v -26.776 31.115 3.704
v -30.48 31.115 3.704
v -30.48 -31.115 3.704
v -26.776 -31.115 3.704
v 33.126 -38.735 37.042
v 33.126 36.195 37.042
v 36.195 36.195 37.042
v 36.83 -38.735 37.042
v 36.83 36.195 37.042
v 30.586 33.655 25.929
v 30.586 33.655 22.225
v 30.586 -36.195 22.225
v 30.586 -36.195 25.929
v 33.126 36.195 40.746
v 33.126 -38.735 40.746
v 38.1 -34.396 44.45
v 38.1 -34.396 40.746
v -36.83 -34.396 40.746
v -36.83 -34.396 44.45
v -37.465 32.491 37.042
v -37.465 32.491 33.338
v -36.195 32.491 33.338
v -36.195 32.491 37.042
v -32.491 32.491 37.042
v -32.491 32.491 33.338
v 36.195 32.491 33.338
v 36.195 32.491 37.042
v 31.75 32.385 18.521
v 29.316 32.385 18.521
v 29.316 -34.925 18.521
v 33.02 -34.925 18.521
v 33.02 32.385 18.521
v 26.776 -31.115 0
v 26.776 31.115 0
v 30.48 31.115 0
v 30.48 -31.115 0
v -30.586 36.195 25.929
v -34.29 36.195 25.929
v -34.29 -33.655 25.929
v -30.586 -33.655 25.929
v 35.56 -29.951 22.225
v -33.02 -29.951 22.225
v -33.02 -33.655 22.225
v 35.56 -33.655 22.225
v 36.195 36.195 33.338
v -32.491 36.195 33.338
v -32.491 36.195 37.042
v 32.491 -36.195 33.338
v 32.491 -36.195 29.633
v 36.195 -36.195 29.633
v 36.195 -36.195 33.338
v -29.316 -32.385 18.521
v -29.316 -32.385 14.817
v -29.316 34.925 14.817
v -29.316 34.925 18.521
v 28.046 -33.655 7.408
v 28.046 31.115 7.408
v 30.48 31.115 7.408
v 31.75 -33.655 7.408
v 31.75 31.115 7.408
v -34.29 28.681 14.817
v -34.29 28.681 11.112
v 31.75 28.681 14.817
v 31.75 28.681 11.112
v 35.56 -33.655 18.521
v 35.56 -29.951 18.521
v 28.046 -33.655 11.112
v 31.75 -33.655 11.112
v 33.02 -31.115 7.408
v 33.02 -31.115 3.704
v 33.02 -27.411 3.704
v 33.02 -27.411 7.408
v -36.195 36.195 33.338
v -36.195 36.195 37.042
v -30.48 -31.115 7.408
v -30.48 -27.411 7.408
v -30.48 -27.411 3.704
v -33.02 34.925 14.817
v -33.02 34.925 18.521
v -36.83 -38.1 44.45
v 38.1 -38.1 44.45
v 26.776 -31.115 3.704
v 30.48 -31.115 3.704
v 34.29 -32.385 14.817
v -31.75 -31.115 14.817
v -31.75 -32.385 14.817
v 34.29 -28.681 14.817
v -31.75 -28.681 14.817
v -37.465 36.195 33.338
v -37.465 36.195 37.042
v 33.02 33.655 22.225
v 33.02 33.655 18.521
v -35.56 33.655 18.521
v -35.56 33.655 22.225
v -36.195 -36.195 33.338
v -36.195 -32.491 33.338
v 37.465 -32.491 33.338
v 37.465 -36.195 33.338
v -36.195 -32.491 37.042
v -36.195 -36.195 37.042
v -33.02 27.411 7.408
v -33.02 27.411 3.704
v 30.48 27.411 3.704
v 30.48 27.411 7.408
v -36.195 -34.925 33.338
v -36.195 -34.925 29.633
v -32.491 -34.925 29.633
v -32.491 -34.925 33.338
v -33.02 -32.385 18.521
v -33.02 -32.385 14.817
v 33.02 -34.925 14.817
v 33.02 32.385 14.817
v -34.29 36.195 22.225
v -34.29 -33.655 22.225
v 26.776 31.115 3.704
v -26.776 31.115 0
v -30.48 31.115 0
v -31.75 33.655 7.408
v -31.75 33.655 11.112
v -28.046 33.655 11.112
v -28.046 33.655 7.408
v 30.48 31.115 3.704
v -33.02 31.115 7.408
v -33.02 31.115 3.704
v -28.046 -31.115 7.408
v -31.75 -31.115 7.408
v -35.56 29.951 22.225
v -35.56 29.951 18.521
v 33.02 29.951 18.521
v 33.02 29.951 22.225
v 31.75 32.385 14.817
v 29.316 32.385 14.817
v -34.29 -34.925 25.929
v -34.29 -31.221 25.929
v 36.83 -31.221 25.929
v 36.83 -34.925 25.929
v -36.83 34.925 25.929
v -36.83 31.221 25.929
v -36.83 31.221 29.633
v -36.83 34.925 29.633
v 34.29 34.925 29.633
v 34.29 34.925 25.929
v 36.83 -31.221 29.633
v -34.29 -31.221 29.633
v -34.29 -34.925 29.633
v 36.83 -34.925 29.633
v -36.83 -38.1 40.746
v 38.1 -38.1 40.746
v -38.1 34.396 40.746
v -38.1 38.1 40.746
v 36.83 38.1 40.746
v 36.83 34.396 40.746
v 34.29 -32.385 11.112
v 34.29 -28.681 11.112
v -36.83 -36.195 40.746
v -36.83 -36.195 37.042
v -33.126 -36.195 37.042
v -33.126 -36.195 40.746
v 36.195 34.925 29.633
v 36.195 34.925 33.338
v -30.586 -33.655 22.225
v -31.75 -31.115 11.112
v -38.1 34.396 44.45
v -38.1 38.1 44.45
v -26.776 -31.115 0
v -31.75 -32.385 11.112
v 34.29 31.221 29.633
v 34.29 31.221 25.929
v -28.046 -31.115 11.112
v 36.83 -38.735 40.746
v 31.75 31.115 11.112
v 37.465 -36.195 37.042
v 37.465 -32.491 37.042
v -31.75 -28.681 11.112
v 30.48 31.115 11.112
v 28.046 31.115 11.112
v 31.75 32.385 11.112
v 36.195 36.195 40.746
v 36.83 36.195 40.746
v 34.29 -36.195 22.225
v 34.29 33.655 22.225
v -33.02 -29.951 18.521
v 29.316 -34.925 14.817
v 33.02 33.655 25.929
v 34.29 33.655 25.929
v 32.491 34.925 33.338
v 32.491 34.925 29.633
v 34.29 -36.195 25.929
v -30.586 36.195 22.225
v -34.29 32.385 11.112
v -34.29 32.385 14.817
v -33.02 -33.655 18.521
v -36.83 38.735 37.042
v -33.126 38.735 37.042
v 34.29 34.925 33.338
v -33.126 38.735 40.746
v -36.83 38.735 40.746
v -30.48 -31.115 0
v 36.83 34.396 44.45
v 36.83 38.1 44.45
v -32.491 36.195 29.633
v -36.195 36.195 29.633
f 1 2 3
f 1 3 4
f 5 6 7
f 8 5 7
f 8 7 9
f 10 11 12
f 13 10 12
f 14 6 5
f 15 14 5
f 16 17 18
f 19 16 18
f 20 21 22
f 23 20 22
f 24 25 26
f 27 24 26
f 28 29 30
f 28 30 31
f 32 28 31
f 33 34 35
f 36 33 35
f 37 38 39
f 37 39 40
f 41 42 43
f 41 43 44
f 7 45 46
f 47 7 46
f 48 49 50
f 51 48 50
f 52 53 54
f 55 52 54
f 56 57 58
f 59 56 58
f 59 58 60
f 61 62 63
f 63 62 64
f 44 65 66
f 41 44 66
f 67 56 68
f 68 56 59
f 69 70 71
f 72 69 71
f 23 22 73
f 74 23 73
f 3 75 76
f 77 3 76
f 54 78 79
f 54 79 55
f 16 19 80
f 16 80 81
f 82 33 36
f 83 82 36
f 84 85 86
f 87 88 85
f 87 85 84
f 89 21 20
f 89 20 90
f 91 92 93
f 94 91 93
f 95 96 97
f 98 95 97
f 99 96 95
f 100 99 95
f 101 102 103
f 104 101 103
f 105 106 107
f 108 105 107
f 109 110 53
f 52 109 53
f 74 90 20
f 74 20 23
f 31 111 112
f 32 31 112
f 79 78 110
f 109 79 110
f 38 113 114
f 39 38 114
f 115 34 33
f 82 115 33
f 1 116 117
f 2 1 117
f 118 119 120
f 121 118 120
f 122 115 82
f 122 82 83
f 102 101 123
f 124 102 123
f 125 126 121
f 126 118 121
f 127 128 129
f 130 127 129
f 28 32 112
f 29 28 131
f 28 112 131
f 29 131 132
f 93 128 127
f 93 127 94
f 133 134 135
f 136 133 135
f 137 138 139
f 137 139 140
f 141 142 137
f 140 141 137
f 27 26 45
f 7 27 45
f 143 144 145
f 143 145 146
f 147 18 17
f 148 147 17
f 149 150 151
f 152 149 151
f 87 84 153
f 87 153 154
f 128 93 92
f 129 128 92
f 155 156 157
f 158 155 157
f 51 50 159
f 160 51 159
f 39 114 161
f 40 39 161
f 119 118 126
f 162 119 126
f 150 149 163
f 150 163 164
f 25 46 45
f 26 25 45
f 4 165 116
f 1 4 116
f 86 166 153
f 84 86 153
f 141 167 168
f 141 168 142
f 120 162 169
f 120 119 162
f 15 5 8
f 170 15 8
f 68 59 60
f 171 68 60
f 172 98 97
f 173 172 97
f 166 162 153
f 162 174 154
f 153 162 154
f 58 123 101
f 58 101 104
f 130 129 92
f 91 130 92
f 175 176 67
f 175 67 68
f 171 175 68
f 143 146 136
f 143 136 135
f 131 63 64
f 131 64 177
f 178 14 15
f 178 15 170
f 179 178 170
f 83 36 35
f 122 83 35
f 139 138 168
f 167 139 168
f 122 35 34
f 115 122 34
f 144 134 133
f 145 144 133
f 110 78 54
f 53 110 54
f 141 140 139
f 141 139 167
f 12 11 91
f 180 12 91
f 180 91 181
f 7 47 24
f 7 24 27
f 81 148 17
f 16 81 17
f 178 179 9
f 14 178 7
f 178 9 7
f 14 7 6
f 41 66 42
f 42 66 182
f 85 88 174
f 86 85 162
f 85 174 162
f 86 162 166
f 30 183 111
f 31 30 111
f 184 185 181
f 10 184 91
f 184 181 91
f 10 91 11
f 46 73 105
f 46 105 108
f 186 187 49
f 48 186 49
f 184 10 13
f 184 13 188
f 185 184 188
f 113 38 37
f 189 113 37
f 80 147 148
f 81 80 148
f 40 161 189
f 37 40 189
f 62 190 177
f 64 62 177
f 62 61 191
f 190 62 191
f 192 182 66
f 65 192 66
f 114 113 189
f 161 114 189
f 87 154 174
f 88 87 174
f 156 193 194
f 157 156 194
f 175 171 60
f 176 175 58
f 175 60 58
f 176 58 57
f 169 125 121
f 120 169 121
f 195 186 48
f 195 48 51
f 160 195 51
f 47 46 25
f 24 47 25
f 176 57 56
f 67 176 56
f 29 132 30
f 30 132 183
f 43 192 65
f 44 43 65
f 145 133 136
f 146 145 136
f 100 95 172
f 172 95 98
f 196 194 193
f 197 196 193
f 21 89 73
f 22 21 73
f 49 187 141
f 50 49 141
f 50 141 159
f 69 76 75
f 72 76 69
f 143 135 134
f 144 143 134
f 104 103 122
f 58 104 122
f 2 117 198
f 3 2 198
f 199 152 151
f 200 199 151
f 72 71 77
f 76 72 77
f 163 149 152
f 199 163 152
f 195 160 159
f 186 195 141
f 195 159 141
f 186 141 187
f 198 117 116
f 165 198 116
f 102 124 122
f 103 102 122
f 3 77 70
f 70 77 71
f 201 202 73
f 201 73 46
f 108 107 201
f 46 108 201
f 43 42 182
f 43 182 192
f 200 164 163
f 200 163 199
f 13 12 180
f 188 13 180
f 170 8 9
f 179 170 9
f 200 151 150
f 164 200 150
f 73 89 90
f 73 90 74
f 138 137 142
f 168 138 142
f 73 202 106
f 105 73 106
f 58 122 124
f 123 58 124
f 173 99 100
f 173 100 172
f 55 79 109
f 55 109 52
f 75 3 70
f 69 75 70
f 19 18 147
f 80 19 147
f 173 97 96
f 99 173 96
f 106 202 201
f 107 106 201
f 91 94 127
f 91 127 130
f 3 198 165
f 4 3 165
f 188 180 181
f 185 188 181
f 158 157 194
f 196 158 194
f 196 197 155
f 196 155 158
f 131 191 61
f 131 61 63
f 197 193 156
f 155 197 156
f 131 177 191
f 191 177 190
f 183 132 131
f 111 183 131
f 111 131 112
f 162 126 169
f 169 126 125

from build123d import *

# Parameters (mm, degrees)
F1_DEPTH  = 3.7041666667
F2_W      = 2.54
F2_H      = 3.7041666667
F2_W_2    = 3.7041666667
F3_DEPTH  = 3.7041666667
F4_W      = 3.7041666667
F4_H      = 2.54
F4_H_2    = 3.7041666667
F5_DEPTH  = 3.7041666667
F4_W_2    = 2.4341666667
F6_W      = 3.7041666667
F6_H      = 2.4341666667
F7_DEPTH  = 3.7041666667
F6_H_2    = 3.7041666667
F6_W_2    = 2.54
F8_W      = 3.7041666667
F8_H      = 2.54
F8_H_2    = 3.7041666667
F9_DEPTH  = 3.7041666667
F8_W_2    = 2.4341666667
F10_W     = 3.7041666667
F10_H     = 3.7041666667
F10_W_2   = 2.54
F11_DEPTH = 3.7041666667
F10_H_2   = 2.4341666667
F12_W     = 3.7041666667
F12_H     = 3.7041666667
F12_H_2   = 2.54
F13_DEPTH = 3.7041666667
F12_W_2   = 2.4341666667
F14_W     = 3.7041666667
F14_H     = 3.7041666667
F14_W_2   = 2.54
F15_DEPTH = 3.7041666667
F14_H_2   = 2.4341666667
F16_W     = 3.7041666667
F16_H     = 3.7041666667
F16_H_2   = 1.27
F17_DEPTH = 3.7041666667
F16_W_2   = 1.7991666667
F18_W     = 1.27
F18_H     = 3.7041666667
F19_DEPTH = 3.7041666667
F18_W_2   = 3.7041666667
F18_H_2   = 2.4341666667
F21_DEPTH = 3.7041666667
F20_W     = 3.0691666667
F20_H     = 3.7041666667
F22_W     = 1.27
F22_H     = 3.7041666667
F22_W_2   = 3.7041666667
F23_DEPTH = 3.7041666667
F22_H_2   = 1.7991666667


# Not quite as in the source:
# - a feature names something its author has since deleted; it is built from what else it names


with BuildPart() as f1:
    # F0 (on Top) → F1 (new body)
    with BuildSketch(Plane.XY):
        Polygon((30.48, 31.115), (26.7758333333, 31.115), (26.7758333333, -6.985), (26.7758333333, -31.115), (30.48, -31.115), align=None)
    extrude(amount=F1_DEPTH)


with BuildPart() as f1b:
    # F0 (on Top) → F1, piece 2 (new body)
    with BuildSketch(Plane.XY):
        Polygon((-26.7758333333, -31.115), (-26.7758333333, 6.985), (-26.7758333333, 31.115), (-30.48, 31.115), (-30.48, -31.115), align=None)
    extrude(amount=F1_DEPTH)


with BuildPart() as f3:
    # F2 (on face) → F3 (new body)
    with BuildSketch(Plane.XY.offset(3.7041666667)):
        Polygon((-26.7758333333, 31.115), (-26.7758333333, 27.4108333333), (0, 27.4108333333), (30.48, 27.4108333333), (30.48, 31.115), align=None)
        with Locations((-31.75, 29.2629166667)):
            Rectangle(F2_W, F2_H)
        with Locations((-28.6279166667, 29.2629166667)):
            Rectangle(F2_W_2, F2_H)
    extrude(amount=F3_DEPTH)


with BuildPart() as f3b:
    # F2 (on face) → F3, piece 2 (new body)
    with BuildSketch(Plane.XY.offset(3.7041666667)):
        with Locations((-28.6279166667, -29.2629166667)):
            Rectangle(F2_W_2, F2_H)
        Polygon((-26.7758333333, -27.4108333333), (-26.7758333333, -31.115), (33.02, -31.115), (33.02, -27.4108333333), (0, -27.4108333333), align=None)
    extrude(amount=F3_DEPTH)


with BuildPart() as f5:
    # F4 (on face) → F5 (new body)
    with BuildSketch(Plane.XY.offset(7.4083333333)):
        Polygon((-28.0458333333, 27.4108333333), (-31.75, 27.4108333333), (-31.75, -31.115), (-28.0458333333, -31.115), (-28.0458333333, 0), align=None)
        with Locations((-29.8979166667, 32.385)):
            Rectangle(F4_W, F4_H)
        with Locations((-29.8979166667, 29.2629166667)):
            Rectangle(F4_W, F4_H_2)
    extrude(amount=F5_DEPTH)


with BuildPart() as f5b:
    # F4 (on face) → F5, piece 2 (new body)
    with BuildSketch(Plane.XY.offset(7.4083333333)):
        with Locations((29.2629166667, 29.2629166667)):
            Rectangle(F4_W_2, F4_H_2)
        Polygon((30.48, 27.4108333333), (28.0458333333, 27.4108333333), (28.0458333333, 0), (28.0458333333, -33.655), (31.75, -33.655), (31.75, 31.115), (30.48, 31.115), align=None)
    extrude(amount=F5_DEPTH)


with BuildPart() as f7:
    # F6 (on face) → F7 (new body)
    with BuildSketch(Plane.XY.offset(11.1125)):
        Polygon((0, -28.6808333333), (-28.0458333333, -28.6808333333), (-28.0458333333, -31.115), (-31.75, -31.115), (-31.75, -32.385), (34.29, -32.385), (34.29, -28.6808333333), align=None)
        with Locations((-29.8979166667, -29.8979166667)):
            Rectangle(F6_W, F6_H)
    extrude(amount=F7_DEPTH)


with BuildPart() as f7b:
    # F6 (on face) → F7, piece 2 (new body)
    with BuildSketch(Plane.XY.offset(11.1125)):
        Polygon((31.75, 32.385), (-28.0458333333, 32.385), (-28.0458333333, 28.6808333333), (0, 28.6808333333), (31.75, 28.6808333333), align=None)
        with Locations((-29.8979166667, 30.5329166667)):
            Rectangle(F6_W, F6_H_2)
        with Locations((-33.02, 30.5329166667)):
            Rectangle(F6_W_2, F6_H_2)
    extrude(amount=F7_DEPTH)


with BuildPart() as f9:
    # F8 (on face) → F9 (new body)
    with BuildSketch(Plane.XY.offset(14.8166666667)):
        Polygon((-29.3158333333, -32.385), (-29.3158333333, 0), (-29.3158333333, 28.6808333333), (-33.02, 28.6808333333), (-33.02, -32.385), align=None)
        with Locations((-31.1679166667, 33.655)):
            Rectangle(F8_W, F8_H)
        with Locations((-31.1679166667, 30.5329166667)):
            Rectangle(F8_W, F8_H_2)
    extrude(amount=F9_DEPTH)


with BuildPart() as f9b:
    # F8 (on face) → F9, piece 2 (new body)
    with BuildSketch(Plane.XY.offset(14.8166666667)):
        with Locations((30.5329166667, 30.5329166667)):
            Rectangle(F8_W_2, F8_H_2)
        Polygon((29.3158333333, -34.925), (33.02, -34.925), (33.02, 32.385), (31.75, 32.385), (31.75, 28.6808333333), (29.3158333333, 28.6808333333), (29.3158333333, 0), align=None)
    extrude(amount=F9_DEPTH)


with BuildPart() as f11:
    # F10 (on face) → F11 (new body)
    with BuildSketch(Plane.XY.offset(18.5208333333)):
        Polygon((-29.3158333333, 29.9508333333), (0, 29.9508333333), (33.02, 29.9508333333), (33.02, 33.655), (-29.3158333333, 33.655), align=None)
        with Locations((-31.1679166667, 31.8029166667)):
            Rectangle(F10_W, F10_H)
        with Locations((-34.29, 31.8029166667)):
            Rectangle(F10_W_2, F10_H)
    extrude(amount=F11_DEPTH)


with BuildPart() as f11b:
    # F10 (on face) → F11, piece 2 (new body)
    with BuildSketch(Plane.XY.offset(18.5208333333)):
        with Locations((-31.1679166667, -31.1679166667)):
            Rectangle(F10_W, F10_H_2)
        Polygon((35.56, -29.9508333333), (0, -29.9508333333), (-29.3158333333, -29.9508333333), (-29.3158333333, -32.385), (-33.02, -32.385), (-33.02, -33.655), (35.56, -33.655), align=None)
    extrude(amount=F11_DEPTH)


with BuildPart() as f13:
    # F12 (on face) → F13 (new body)
    with BuildSketch(Plane.XY.offset(22.225)):
        Polygon((-30.5858333333, -33.655), (-30.5858333333, 0), (-30.5858333333, 29.9508333333), (-34.29, 29.9508333333), (-34.29, -33.655), align=None)
        with Locations((-32.4379166667, 31.8029166667)):
            Rectangle(F12_W, F12_H)
        with Locations((-32.4379166667, 34.925)):
            Rectangle(F12_W, F12_H_2)
    extrude(amount=F13_DEPTH)


with BuildPart() as f13b:
    # F12 (on face) → F13, piece 2 (new body)
    with BuildSketch(Plane.XY.offset(22.225)):
        Polygon((34.29, -36.195), (34.29, 33.655), (33.02, 33.655), (33.02, 29.9508333333), (30.5858333333, 29.9508333333), (30.5858333333, 0), (30.5858333333, -36.195), align=None)
        with Locations((31.8029166667, 31.8029166667)):
            Rectangle(F12_W_2, F12_H)
    extrude(amount=F13_DEPTH)


with BuildPart() as f15:
    # F14 (on face) → F15 (new body)
    with BuildSketch(Plane.XY.offset(25.9291666667)):
        Polygon((34.29, 34.925), (-30.5858333333, 34.925), (-30.5858333333, 31.2208333333), (0, 31.2208333333), (34.29, 31.2208333333), align=None)
        with Locations((-32.4379166667, 33.0729166667)):
            Rectangle(F14_W, F14_H)
        with Locations((-35.56, 33.0729166667)):
            Rectangle(F14_W_2, F14_H)
    extrude(amount=F15_DEPTH)


with BuildPart() as f15b:
    # F14 (on face) → F15, piece 2 (new body)
    with BuildSketch(Plane.XY.offset(25.9291666667)):
        with Locations((-32.4379166667, -32.4379166667)):
            Rectangle(F14_W, F14_H_2)
        Polygon((0, -31.2208333333), (-30.5858333333, -31.2208333333), (-30.5858333333, -33.655), (-34.29, -33.655), (-34.29, -34.925), (36.83, -34.925), (36.83, -31.2208333333), align=None)
    extrude(amount=F15_DEPTH)


with BuildPart() as f17:
    # F16 (on face) → F17 (new body)
    with BuildSketch(Plane.XY.offset(29.6333333333)):
        Polygon((-32.4908333333, -34.925), (-32.4908333333, 0), (-32.4908333333, 31.2208333333), (-36.195, 31.2208333333), (-36.195, -34.925), align=None)
        with Locations((-34.3429166667, 33.0729166667)):
            Rectangle(F16_W, F16_H)
        with Locations((-34.3429166667, 35.56)):
            Rectangle(F16_W, F16_H_2)
    extrude(amount=F17_DEPTH)


with BuildPart() as f17b:
    # F16 (on face) → F17, piece 2 (new body)
    with BuildSketch(Plane.XY.offset(29.6333333333)):
        with Locations((33.3904166667, 33.0729166667)):
            Rectangle(F16_W_2, F16_H)
        Polygon((36.195, -36.195), (36.195, 34.925), (34.29, 34.925), (34.29, 31.2208333333), (32.4908333333, 31.2208333333), (32.4908333333, 0), (32.4908333333, -36.195), align=None)
    extrude(amount=F17_DEPTH)


with BuildPart() as f19:
    # F18 (on face) → F19 (new body)
    with BuildSketch(Plane.XY.offset(33.3375)):
        with Locations((-36.83, 34.3429166667)):
            Rectangle(F18_W, F18_H)
    extrude(amount=F19_DEPTH)


with BuildPart() as f19b:
    # F18 (on face) → F19, piece 2 (new body)
    with BuildSketch(Plane.XY.offset(33.3375)):
        Polygon((36.195, 36.195), (-32.4908333333, 36.195), (-32.4908333333, 32.4908333333), (0, 32.4908333333), (36.195, 32.4908333333), align=None)
    extrude(amount=F19_DEPTH)


with BuildPart() as f19c:
    # F18 (on face) → F19, piece 3 (new body)
    with BuildSketch(Plane.XY.offset(33.3375)):
        with Locations((-34.3429166667, -33.7079166667)):
            Rectangle(F18_W_2, F18_H_2)
        Polygon((0, -32.4908333333), (-32.4908333333, -32.4908333333), (-32.4908333333, -34.925), (-36.195, -34.925), (-36.195, -36.195), (37.465, -36.195), (37.465, -32.4908333333), align=None)
    extrude(amount=F19_DEPTH)


with BuildPart() as f21:
    # F20 (on face) → F21 (new body)
    with BuildSketch(Plane.XY.offset(37.0416666667)):
        Polygon((-33.1258333333, -36.195), (-33.1258333333, 0), (-33.1258333333, 38.735), (-36.83, 38.735), (-36.83, -36.195), align=None)
    extrude(amount=F21_DEPTH)


with BuildPart() as f21b:
    # F20 (on face) → F21, piece 2 (new body)
    with BuildSketch(Plane.XY.offset(37.0416666667)):
        Polygon((36.83, -38.735), (36.83, 36.195), (36.195, 36.195), (36.195, 32.4908333333), (33.1258333333, 32.4908333333), (33.1258333333, 0), (33.1258333333, -38.735), align=None)
        with Locations((34.6604166667, 34.3429166667)):
            Rectangle(F20_W, F20_H)
    extrude(amount=F21_DEPTH)


with BuildPart() as f23:
    # F22 (on face) → F23 (new body)
    with BuildSketch(Plane.XY.offset(40.7458333333)):
        Polygon((-33.1258333333, 34.3958333333), (0, 34.3958333333), (36.83, 34.3958333333), (36.83, 38.1), (-33.1258333333, 38.1), align=None)
        with Locations((-37.465, 36.2479166667)):
            Rectangle(F22_W, F22_H)
        with Locations((-34.9779166667, 36.2479166667)):
            Rectangle(F22_W_2, F22_H)
    extrude(amount=F23_DEPTH)


with BuildPart() as f23b:
    # F22 (on face) → F23, piece 2 (new body)
    with BuildSketch(Plane.XY.offset(40.7458333333)):
        with Locations((-34.9779166667, -35.2954166667)):
            Rectangle(F22_W_2, F22_H_2)
        Polygon((38.1, -34.3958333333), (0, -34.3958333333), (-33.1258333333, -34.3958333333), (-33.1258333333, -36.195), (-36.83, -36.195), (-36.83, -38.1), (38.1, -38.1), align=None)
    extrude(amount=F23_DEPTH)


solid = Compound([f1.part, f1b.part, f3.part, f3b.part, f5.part, f5b.part, f7.part, f7b.part, f9.part, f9b.part, f11.part, f11b.part, f13.part, f13b.part, f15.part, f15b.part, f17.part, f17b.part, f19.part, f19b.part, f19c.part, f21.part, f21b.part, f23.part, f23b.part])
